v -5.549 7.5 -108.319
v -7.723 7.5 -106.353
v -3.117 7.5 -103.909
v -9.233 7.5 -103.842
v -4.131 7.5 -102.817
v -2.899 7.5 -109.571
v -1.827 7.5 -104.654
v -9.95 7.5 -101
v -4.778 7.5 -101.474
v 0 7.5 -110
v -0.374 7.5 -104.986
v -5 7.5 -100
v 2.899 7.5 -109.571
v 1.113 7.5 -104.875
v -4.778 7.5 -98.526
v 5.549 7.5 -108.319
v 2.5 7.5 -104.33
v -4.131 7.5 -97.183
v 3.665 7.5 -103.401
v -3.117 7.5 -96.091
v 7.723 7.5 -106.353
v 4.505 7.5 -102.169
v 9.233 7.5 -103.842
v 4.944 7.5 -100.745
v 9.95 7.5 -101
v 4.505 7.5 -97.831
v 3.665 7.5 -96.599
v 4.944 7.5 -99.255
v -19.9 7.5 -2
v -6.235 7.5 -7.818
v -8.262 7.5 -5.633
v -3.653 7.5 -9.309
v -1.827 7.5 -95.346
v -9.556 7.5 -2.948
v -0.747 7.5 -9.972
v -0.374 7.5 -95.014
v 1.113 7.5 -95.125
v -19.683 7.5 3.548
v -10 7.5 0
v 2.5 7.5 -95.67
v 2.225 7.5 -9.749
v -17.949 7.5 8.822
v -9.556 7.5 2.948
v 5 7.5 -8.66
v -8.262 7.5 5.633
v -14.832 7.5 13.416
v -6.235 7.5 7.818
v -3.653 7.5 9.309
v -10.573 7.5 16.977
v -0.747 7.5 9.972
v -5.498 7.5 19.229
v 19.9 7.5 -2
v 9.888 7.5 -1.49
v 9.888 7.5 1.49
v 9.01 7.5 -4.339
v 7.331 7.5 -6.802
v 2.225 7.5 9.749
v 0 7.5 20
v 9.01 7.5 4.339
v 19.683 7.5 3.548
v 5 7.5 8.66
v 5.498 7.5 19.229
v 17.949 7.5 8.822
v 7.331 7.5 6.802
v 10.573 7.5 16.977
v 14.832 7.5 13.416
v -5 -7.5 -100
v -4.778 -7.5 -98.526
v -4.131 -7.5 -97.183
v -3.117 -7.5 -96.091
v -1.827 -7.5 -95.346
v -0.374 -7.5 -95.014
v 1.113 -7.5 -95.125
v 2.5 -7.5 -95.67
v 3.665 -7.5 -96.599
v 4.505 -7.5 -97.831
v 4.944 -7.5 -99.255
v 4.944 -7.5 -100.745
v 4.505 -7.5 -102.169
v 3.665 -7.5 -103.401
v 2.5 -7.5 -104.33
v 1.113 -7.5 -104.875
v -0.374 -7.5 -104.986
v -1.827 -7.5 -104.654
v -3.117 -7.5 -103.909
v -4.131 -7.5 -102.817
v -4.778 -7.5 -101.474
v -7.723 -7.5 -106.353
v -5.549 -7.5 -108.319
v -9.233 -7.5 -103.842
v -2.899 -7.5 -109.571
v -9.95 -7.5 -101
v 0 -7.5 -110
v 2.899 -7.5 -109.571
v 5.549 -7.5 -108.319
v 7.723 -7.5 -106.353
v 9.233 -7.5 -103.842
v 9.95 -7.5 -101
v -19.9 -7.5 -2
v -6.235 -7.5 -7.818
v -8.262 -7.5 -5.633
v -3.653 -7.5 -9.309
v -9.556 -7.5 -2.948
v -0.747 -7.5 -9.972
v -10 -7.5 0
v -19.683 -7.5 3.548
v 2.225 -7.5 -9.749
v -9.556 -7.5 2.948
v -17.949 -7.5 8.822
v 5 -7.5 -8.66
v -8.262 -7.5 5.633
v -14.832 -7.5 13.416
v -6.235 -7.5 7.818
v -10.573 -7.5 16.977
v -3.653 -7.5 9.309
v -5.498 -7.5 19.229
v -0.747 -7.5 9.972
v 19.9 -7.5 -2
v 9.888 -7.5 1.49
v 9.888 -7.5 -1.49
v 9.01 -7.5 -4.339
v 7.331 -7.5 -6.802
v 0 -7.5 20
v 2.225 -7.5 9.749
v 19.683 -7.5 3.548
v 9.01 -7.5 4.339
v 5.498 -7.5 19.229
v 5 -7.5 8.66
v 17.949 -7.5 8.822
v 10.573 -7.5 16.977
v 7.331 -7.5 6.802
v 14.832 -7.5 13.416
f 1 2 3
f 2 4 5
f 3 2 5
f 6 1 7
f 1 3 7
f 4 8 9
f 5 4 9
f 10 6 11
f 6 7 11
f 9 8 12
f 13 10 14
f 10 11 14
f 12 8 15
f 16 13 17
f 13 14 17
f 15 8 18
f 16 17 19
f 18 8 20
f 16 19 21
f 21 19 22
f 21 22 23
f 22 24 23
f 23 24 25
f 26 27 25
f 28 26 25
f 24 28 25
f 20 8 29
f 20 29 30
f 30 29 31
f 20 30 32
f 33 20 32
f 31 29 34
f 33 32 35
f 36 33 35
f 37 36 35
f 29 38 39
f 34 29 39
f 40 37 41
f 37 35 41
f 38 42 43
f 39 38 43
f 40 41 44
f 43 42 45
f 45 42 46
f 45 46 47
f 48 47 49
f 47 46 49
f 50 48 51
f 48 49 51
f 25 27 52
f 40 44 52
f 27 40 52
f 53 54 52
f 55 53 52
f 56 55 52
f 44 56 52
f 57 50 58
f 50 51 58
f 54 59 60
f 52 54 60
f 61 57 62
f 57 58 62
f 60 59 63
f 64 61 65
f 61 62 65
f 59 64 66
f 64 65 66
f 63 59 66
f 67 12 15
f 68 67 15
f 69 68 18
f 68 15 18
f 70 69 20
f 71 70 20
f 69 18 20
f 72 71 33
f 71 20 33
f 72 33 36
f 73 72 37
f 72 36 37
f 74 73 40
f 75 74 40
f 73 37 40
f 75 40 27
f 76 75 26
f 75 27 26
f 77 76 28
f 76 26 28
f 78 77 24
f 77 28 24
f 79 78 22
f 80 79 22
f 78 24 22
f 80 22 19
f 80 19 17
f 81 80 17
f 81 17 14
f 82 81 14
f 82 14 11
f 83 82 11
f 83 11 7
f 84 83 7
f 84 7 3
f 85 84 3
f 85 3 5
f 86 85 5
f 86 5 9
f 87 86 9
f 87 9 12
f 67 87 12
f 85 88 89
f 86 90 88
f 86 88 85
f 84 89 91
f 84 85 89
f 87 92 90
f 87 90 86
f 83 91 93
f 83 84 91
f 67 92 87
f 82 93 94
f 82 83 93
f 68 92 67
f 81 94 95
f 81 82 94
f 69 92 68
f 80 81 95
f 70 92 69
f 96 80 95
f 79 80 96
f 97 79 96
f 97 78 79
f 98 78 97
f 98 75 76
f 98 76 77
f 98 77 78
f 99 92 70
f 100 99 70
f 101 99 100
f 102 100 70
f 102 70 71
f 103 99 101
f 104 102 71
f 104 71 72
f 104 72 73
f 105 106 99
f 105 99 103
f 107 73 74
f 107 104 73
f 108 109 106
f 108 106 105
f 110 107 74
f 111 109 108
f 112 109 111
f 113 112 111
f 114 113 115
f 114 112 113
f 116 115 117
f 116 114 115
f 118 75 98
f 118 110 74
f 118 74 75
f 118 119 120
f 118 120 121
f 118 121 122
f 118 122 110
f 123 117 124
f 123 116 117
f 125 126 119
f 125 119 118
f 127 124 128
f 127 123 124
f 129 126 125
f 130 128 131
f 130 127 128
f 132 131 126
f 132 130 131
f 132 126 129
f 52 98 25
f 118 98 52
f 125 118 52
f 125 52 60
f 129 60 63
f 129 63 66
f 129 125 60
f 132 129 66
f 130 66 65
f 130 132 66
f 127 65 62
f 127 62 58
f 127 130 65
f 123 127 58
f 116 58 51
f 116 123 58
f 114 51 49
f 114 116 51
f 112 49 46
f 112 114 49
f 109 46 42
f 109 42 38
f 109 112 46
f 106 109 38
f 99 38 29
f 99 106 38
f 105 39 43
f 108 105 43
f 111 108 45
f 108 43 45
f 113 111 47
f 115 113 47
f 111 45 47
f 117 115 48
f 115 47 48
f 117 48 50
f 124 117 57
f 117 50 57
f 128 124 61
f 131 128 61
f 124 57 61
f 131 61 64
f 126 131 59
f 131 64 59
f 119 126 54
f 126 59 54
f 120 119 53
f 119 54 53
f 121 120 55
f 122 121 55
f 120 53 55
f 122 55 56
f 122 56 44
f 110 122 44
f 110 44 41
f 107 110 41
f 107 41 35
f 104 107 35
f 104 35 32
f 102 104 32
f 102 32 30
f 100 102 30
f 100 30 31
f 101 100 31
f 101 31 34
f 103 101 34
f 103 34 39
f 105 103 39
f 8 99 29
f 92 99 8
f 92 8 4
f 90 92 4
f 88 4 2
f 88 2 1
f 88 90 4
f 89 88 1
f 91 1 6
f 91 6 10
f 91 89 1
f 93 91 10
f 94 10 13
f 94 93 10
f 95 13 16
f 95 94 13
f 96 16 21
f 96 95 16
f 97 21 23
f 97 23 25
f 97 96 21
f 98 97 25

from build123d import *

# Parameters (mm, degrees)
F1_DEPTH = 7.5
F3_D     = 20
F4_D     = 10


with BuildPart() as f1:
    # F0 (on Front) → F1 (new body, symmetric)
    with BuildSketch(Plane.XZ):
        with BuildLine():
            Line((9.9498743711, -101), (19.8997487421, -2))
            ThreePointArc((19.8997487421, -2), (0, 20), (-19.8997487421, -2))
            Line((-19.8997487421, -2), (-9.9498743711, -101))
            ThreePointArc((-9.9498743711, -101), (0, -110), (9.9498743711, -101))
        make_face()
    extrude(amount=F1_DEPTH, both=True)

    # F3 (through all)
    with Locations(Plane.XZ.offset(7.5)):
        with Locations((0, 0)):
            Hole(F3_D / 2)

    # F4 (through all)
    with Locations(Plane.XZ.offset(7.5)):
        with Locations((0, -100)):
            Hole(F4_D / 2)


solid = f1.part
